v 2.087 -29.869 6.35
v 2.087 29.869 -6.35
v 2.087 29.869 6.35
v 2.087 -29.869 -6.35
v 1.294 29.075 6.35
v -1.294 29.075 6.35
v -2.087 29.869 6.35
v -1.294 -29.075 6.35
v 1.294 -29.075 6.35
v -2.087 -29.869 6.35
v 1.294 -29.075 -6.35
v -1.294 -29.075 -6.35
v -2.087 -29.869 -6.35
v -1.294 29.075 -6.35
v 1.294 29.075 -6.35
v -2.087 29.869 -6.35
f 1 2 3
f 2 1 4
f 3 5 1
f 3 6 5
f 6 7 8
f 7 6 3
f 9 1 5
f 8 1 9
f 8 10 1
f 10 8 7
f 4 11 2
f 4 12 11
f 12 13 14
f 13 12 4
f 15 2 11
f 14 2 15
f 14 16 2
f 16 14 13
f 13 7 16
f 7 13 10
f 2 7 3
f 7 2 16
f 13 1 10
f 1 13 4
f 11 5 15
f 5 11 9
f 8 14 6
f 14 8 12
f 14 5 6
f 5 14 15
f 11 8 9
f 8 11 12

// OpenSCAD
$fa = 1;
$fs = 0.4;
inches = 25.4;
slot1_x = 0.1 * inches;
slot2_x = 2.6 * inches;
edge_slack = 1; // mm
slot_width = 0.0625*inches + edge_slack;
slot_length = 2.35*inches - slot1_x+edge_slack;
slot_height = 0.5 * inches;
wall_thickness = 0.0625*inches;
 difference() {
    cube([slot_width+wall_thickness, slot_length+wall_thickness, slot_height], center=true);
    cube([slot_width, slot_length, slot_height+1], center=true);
}
